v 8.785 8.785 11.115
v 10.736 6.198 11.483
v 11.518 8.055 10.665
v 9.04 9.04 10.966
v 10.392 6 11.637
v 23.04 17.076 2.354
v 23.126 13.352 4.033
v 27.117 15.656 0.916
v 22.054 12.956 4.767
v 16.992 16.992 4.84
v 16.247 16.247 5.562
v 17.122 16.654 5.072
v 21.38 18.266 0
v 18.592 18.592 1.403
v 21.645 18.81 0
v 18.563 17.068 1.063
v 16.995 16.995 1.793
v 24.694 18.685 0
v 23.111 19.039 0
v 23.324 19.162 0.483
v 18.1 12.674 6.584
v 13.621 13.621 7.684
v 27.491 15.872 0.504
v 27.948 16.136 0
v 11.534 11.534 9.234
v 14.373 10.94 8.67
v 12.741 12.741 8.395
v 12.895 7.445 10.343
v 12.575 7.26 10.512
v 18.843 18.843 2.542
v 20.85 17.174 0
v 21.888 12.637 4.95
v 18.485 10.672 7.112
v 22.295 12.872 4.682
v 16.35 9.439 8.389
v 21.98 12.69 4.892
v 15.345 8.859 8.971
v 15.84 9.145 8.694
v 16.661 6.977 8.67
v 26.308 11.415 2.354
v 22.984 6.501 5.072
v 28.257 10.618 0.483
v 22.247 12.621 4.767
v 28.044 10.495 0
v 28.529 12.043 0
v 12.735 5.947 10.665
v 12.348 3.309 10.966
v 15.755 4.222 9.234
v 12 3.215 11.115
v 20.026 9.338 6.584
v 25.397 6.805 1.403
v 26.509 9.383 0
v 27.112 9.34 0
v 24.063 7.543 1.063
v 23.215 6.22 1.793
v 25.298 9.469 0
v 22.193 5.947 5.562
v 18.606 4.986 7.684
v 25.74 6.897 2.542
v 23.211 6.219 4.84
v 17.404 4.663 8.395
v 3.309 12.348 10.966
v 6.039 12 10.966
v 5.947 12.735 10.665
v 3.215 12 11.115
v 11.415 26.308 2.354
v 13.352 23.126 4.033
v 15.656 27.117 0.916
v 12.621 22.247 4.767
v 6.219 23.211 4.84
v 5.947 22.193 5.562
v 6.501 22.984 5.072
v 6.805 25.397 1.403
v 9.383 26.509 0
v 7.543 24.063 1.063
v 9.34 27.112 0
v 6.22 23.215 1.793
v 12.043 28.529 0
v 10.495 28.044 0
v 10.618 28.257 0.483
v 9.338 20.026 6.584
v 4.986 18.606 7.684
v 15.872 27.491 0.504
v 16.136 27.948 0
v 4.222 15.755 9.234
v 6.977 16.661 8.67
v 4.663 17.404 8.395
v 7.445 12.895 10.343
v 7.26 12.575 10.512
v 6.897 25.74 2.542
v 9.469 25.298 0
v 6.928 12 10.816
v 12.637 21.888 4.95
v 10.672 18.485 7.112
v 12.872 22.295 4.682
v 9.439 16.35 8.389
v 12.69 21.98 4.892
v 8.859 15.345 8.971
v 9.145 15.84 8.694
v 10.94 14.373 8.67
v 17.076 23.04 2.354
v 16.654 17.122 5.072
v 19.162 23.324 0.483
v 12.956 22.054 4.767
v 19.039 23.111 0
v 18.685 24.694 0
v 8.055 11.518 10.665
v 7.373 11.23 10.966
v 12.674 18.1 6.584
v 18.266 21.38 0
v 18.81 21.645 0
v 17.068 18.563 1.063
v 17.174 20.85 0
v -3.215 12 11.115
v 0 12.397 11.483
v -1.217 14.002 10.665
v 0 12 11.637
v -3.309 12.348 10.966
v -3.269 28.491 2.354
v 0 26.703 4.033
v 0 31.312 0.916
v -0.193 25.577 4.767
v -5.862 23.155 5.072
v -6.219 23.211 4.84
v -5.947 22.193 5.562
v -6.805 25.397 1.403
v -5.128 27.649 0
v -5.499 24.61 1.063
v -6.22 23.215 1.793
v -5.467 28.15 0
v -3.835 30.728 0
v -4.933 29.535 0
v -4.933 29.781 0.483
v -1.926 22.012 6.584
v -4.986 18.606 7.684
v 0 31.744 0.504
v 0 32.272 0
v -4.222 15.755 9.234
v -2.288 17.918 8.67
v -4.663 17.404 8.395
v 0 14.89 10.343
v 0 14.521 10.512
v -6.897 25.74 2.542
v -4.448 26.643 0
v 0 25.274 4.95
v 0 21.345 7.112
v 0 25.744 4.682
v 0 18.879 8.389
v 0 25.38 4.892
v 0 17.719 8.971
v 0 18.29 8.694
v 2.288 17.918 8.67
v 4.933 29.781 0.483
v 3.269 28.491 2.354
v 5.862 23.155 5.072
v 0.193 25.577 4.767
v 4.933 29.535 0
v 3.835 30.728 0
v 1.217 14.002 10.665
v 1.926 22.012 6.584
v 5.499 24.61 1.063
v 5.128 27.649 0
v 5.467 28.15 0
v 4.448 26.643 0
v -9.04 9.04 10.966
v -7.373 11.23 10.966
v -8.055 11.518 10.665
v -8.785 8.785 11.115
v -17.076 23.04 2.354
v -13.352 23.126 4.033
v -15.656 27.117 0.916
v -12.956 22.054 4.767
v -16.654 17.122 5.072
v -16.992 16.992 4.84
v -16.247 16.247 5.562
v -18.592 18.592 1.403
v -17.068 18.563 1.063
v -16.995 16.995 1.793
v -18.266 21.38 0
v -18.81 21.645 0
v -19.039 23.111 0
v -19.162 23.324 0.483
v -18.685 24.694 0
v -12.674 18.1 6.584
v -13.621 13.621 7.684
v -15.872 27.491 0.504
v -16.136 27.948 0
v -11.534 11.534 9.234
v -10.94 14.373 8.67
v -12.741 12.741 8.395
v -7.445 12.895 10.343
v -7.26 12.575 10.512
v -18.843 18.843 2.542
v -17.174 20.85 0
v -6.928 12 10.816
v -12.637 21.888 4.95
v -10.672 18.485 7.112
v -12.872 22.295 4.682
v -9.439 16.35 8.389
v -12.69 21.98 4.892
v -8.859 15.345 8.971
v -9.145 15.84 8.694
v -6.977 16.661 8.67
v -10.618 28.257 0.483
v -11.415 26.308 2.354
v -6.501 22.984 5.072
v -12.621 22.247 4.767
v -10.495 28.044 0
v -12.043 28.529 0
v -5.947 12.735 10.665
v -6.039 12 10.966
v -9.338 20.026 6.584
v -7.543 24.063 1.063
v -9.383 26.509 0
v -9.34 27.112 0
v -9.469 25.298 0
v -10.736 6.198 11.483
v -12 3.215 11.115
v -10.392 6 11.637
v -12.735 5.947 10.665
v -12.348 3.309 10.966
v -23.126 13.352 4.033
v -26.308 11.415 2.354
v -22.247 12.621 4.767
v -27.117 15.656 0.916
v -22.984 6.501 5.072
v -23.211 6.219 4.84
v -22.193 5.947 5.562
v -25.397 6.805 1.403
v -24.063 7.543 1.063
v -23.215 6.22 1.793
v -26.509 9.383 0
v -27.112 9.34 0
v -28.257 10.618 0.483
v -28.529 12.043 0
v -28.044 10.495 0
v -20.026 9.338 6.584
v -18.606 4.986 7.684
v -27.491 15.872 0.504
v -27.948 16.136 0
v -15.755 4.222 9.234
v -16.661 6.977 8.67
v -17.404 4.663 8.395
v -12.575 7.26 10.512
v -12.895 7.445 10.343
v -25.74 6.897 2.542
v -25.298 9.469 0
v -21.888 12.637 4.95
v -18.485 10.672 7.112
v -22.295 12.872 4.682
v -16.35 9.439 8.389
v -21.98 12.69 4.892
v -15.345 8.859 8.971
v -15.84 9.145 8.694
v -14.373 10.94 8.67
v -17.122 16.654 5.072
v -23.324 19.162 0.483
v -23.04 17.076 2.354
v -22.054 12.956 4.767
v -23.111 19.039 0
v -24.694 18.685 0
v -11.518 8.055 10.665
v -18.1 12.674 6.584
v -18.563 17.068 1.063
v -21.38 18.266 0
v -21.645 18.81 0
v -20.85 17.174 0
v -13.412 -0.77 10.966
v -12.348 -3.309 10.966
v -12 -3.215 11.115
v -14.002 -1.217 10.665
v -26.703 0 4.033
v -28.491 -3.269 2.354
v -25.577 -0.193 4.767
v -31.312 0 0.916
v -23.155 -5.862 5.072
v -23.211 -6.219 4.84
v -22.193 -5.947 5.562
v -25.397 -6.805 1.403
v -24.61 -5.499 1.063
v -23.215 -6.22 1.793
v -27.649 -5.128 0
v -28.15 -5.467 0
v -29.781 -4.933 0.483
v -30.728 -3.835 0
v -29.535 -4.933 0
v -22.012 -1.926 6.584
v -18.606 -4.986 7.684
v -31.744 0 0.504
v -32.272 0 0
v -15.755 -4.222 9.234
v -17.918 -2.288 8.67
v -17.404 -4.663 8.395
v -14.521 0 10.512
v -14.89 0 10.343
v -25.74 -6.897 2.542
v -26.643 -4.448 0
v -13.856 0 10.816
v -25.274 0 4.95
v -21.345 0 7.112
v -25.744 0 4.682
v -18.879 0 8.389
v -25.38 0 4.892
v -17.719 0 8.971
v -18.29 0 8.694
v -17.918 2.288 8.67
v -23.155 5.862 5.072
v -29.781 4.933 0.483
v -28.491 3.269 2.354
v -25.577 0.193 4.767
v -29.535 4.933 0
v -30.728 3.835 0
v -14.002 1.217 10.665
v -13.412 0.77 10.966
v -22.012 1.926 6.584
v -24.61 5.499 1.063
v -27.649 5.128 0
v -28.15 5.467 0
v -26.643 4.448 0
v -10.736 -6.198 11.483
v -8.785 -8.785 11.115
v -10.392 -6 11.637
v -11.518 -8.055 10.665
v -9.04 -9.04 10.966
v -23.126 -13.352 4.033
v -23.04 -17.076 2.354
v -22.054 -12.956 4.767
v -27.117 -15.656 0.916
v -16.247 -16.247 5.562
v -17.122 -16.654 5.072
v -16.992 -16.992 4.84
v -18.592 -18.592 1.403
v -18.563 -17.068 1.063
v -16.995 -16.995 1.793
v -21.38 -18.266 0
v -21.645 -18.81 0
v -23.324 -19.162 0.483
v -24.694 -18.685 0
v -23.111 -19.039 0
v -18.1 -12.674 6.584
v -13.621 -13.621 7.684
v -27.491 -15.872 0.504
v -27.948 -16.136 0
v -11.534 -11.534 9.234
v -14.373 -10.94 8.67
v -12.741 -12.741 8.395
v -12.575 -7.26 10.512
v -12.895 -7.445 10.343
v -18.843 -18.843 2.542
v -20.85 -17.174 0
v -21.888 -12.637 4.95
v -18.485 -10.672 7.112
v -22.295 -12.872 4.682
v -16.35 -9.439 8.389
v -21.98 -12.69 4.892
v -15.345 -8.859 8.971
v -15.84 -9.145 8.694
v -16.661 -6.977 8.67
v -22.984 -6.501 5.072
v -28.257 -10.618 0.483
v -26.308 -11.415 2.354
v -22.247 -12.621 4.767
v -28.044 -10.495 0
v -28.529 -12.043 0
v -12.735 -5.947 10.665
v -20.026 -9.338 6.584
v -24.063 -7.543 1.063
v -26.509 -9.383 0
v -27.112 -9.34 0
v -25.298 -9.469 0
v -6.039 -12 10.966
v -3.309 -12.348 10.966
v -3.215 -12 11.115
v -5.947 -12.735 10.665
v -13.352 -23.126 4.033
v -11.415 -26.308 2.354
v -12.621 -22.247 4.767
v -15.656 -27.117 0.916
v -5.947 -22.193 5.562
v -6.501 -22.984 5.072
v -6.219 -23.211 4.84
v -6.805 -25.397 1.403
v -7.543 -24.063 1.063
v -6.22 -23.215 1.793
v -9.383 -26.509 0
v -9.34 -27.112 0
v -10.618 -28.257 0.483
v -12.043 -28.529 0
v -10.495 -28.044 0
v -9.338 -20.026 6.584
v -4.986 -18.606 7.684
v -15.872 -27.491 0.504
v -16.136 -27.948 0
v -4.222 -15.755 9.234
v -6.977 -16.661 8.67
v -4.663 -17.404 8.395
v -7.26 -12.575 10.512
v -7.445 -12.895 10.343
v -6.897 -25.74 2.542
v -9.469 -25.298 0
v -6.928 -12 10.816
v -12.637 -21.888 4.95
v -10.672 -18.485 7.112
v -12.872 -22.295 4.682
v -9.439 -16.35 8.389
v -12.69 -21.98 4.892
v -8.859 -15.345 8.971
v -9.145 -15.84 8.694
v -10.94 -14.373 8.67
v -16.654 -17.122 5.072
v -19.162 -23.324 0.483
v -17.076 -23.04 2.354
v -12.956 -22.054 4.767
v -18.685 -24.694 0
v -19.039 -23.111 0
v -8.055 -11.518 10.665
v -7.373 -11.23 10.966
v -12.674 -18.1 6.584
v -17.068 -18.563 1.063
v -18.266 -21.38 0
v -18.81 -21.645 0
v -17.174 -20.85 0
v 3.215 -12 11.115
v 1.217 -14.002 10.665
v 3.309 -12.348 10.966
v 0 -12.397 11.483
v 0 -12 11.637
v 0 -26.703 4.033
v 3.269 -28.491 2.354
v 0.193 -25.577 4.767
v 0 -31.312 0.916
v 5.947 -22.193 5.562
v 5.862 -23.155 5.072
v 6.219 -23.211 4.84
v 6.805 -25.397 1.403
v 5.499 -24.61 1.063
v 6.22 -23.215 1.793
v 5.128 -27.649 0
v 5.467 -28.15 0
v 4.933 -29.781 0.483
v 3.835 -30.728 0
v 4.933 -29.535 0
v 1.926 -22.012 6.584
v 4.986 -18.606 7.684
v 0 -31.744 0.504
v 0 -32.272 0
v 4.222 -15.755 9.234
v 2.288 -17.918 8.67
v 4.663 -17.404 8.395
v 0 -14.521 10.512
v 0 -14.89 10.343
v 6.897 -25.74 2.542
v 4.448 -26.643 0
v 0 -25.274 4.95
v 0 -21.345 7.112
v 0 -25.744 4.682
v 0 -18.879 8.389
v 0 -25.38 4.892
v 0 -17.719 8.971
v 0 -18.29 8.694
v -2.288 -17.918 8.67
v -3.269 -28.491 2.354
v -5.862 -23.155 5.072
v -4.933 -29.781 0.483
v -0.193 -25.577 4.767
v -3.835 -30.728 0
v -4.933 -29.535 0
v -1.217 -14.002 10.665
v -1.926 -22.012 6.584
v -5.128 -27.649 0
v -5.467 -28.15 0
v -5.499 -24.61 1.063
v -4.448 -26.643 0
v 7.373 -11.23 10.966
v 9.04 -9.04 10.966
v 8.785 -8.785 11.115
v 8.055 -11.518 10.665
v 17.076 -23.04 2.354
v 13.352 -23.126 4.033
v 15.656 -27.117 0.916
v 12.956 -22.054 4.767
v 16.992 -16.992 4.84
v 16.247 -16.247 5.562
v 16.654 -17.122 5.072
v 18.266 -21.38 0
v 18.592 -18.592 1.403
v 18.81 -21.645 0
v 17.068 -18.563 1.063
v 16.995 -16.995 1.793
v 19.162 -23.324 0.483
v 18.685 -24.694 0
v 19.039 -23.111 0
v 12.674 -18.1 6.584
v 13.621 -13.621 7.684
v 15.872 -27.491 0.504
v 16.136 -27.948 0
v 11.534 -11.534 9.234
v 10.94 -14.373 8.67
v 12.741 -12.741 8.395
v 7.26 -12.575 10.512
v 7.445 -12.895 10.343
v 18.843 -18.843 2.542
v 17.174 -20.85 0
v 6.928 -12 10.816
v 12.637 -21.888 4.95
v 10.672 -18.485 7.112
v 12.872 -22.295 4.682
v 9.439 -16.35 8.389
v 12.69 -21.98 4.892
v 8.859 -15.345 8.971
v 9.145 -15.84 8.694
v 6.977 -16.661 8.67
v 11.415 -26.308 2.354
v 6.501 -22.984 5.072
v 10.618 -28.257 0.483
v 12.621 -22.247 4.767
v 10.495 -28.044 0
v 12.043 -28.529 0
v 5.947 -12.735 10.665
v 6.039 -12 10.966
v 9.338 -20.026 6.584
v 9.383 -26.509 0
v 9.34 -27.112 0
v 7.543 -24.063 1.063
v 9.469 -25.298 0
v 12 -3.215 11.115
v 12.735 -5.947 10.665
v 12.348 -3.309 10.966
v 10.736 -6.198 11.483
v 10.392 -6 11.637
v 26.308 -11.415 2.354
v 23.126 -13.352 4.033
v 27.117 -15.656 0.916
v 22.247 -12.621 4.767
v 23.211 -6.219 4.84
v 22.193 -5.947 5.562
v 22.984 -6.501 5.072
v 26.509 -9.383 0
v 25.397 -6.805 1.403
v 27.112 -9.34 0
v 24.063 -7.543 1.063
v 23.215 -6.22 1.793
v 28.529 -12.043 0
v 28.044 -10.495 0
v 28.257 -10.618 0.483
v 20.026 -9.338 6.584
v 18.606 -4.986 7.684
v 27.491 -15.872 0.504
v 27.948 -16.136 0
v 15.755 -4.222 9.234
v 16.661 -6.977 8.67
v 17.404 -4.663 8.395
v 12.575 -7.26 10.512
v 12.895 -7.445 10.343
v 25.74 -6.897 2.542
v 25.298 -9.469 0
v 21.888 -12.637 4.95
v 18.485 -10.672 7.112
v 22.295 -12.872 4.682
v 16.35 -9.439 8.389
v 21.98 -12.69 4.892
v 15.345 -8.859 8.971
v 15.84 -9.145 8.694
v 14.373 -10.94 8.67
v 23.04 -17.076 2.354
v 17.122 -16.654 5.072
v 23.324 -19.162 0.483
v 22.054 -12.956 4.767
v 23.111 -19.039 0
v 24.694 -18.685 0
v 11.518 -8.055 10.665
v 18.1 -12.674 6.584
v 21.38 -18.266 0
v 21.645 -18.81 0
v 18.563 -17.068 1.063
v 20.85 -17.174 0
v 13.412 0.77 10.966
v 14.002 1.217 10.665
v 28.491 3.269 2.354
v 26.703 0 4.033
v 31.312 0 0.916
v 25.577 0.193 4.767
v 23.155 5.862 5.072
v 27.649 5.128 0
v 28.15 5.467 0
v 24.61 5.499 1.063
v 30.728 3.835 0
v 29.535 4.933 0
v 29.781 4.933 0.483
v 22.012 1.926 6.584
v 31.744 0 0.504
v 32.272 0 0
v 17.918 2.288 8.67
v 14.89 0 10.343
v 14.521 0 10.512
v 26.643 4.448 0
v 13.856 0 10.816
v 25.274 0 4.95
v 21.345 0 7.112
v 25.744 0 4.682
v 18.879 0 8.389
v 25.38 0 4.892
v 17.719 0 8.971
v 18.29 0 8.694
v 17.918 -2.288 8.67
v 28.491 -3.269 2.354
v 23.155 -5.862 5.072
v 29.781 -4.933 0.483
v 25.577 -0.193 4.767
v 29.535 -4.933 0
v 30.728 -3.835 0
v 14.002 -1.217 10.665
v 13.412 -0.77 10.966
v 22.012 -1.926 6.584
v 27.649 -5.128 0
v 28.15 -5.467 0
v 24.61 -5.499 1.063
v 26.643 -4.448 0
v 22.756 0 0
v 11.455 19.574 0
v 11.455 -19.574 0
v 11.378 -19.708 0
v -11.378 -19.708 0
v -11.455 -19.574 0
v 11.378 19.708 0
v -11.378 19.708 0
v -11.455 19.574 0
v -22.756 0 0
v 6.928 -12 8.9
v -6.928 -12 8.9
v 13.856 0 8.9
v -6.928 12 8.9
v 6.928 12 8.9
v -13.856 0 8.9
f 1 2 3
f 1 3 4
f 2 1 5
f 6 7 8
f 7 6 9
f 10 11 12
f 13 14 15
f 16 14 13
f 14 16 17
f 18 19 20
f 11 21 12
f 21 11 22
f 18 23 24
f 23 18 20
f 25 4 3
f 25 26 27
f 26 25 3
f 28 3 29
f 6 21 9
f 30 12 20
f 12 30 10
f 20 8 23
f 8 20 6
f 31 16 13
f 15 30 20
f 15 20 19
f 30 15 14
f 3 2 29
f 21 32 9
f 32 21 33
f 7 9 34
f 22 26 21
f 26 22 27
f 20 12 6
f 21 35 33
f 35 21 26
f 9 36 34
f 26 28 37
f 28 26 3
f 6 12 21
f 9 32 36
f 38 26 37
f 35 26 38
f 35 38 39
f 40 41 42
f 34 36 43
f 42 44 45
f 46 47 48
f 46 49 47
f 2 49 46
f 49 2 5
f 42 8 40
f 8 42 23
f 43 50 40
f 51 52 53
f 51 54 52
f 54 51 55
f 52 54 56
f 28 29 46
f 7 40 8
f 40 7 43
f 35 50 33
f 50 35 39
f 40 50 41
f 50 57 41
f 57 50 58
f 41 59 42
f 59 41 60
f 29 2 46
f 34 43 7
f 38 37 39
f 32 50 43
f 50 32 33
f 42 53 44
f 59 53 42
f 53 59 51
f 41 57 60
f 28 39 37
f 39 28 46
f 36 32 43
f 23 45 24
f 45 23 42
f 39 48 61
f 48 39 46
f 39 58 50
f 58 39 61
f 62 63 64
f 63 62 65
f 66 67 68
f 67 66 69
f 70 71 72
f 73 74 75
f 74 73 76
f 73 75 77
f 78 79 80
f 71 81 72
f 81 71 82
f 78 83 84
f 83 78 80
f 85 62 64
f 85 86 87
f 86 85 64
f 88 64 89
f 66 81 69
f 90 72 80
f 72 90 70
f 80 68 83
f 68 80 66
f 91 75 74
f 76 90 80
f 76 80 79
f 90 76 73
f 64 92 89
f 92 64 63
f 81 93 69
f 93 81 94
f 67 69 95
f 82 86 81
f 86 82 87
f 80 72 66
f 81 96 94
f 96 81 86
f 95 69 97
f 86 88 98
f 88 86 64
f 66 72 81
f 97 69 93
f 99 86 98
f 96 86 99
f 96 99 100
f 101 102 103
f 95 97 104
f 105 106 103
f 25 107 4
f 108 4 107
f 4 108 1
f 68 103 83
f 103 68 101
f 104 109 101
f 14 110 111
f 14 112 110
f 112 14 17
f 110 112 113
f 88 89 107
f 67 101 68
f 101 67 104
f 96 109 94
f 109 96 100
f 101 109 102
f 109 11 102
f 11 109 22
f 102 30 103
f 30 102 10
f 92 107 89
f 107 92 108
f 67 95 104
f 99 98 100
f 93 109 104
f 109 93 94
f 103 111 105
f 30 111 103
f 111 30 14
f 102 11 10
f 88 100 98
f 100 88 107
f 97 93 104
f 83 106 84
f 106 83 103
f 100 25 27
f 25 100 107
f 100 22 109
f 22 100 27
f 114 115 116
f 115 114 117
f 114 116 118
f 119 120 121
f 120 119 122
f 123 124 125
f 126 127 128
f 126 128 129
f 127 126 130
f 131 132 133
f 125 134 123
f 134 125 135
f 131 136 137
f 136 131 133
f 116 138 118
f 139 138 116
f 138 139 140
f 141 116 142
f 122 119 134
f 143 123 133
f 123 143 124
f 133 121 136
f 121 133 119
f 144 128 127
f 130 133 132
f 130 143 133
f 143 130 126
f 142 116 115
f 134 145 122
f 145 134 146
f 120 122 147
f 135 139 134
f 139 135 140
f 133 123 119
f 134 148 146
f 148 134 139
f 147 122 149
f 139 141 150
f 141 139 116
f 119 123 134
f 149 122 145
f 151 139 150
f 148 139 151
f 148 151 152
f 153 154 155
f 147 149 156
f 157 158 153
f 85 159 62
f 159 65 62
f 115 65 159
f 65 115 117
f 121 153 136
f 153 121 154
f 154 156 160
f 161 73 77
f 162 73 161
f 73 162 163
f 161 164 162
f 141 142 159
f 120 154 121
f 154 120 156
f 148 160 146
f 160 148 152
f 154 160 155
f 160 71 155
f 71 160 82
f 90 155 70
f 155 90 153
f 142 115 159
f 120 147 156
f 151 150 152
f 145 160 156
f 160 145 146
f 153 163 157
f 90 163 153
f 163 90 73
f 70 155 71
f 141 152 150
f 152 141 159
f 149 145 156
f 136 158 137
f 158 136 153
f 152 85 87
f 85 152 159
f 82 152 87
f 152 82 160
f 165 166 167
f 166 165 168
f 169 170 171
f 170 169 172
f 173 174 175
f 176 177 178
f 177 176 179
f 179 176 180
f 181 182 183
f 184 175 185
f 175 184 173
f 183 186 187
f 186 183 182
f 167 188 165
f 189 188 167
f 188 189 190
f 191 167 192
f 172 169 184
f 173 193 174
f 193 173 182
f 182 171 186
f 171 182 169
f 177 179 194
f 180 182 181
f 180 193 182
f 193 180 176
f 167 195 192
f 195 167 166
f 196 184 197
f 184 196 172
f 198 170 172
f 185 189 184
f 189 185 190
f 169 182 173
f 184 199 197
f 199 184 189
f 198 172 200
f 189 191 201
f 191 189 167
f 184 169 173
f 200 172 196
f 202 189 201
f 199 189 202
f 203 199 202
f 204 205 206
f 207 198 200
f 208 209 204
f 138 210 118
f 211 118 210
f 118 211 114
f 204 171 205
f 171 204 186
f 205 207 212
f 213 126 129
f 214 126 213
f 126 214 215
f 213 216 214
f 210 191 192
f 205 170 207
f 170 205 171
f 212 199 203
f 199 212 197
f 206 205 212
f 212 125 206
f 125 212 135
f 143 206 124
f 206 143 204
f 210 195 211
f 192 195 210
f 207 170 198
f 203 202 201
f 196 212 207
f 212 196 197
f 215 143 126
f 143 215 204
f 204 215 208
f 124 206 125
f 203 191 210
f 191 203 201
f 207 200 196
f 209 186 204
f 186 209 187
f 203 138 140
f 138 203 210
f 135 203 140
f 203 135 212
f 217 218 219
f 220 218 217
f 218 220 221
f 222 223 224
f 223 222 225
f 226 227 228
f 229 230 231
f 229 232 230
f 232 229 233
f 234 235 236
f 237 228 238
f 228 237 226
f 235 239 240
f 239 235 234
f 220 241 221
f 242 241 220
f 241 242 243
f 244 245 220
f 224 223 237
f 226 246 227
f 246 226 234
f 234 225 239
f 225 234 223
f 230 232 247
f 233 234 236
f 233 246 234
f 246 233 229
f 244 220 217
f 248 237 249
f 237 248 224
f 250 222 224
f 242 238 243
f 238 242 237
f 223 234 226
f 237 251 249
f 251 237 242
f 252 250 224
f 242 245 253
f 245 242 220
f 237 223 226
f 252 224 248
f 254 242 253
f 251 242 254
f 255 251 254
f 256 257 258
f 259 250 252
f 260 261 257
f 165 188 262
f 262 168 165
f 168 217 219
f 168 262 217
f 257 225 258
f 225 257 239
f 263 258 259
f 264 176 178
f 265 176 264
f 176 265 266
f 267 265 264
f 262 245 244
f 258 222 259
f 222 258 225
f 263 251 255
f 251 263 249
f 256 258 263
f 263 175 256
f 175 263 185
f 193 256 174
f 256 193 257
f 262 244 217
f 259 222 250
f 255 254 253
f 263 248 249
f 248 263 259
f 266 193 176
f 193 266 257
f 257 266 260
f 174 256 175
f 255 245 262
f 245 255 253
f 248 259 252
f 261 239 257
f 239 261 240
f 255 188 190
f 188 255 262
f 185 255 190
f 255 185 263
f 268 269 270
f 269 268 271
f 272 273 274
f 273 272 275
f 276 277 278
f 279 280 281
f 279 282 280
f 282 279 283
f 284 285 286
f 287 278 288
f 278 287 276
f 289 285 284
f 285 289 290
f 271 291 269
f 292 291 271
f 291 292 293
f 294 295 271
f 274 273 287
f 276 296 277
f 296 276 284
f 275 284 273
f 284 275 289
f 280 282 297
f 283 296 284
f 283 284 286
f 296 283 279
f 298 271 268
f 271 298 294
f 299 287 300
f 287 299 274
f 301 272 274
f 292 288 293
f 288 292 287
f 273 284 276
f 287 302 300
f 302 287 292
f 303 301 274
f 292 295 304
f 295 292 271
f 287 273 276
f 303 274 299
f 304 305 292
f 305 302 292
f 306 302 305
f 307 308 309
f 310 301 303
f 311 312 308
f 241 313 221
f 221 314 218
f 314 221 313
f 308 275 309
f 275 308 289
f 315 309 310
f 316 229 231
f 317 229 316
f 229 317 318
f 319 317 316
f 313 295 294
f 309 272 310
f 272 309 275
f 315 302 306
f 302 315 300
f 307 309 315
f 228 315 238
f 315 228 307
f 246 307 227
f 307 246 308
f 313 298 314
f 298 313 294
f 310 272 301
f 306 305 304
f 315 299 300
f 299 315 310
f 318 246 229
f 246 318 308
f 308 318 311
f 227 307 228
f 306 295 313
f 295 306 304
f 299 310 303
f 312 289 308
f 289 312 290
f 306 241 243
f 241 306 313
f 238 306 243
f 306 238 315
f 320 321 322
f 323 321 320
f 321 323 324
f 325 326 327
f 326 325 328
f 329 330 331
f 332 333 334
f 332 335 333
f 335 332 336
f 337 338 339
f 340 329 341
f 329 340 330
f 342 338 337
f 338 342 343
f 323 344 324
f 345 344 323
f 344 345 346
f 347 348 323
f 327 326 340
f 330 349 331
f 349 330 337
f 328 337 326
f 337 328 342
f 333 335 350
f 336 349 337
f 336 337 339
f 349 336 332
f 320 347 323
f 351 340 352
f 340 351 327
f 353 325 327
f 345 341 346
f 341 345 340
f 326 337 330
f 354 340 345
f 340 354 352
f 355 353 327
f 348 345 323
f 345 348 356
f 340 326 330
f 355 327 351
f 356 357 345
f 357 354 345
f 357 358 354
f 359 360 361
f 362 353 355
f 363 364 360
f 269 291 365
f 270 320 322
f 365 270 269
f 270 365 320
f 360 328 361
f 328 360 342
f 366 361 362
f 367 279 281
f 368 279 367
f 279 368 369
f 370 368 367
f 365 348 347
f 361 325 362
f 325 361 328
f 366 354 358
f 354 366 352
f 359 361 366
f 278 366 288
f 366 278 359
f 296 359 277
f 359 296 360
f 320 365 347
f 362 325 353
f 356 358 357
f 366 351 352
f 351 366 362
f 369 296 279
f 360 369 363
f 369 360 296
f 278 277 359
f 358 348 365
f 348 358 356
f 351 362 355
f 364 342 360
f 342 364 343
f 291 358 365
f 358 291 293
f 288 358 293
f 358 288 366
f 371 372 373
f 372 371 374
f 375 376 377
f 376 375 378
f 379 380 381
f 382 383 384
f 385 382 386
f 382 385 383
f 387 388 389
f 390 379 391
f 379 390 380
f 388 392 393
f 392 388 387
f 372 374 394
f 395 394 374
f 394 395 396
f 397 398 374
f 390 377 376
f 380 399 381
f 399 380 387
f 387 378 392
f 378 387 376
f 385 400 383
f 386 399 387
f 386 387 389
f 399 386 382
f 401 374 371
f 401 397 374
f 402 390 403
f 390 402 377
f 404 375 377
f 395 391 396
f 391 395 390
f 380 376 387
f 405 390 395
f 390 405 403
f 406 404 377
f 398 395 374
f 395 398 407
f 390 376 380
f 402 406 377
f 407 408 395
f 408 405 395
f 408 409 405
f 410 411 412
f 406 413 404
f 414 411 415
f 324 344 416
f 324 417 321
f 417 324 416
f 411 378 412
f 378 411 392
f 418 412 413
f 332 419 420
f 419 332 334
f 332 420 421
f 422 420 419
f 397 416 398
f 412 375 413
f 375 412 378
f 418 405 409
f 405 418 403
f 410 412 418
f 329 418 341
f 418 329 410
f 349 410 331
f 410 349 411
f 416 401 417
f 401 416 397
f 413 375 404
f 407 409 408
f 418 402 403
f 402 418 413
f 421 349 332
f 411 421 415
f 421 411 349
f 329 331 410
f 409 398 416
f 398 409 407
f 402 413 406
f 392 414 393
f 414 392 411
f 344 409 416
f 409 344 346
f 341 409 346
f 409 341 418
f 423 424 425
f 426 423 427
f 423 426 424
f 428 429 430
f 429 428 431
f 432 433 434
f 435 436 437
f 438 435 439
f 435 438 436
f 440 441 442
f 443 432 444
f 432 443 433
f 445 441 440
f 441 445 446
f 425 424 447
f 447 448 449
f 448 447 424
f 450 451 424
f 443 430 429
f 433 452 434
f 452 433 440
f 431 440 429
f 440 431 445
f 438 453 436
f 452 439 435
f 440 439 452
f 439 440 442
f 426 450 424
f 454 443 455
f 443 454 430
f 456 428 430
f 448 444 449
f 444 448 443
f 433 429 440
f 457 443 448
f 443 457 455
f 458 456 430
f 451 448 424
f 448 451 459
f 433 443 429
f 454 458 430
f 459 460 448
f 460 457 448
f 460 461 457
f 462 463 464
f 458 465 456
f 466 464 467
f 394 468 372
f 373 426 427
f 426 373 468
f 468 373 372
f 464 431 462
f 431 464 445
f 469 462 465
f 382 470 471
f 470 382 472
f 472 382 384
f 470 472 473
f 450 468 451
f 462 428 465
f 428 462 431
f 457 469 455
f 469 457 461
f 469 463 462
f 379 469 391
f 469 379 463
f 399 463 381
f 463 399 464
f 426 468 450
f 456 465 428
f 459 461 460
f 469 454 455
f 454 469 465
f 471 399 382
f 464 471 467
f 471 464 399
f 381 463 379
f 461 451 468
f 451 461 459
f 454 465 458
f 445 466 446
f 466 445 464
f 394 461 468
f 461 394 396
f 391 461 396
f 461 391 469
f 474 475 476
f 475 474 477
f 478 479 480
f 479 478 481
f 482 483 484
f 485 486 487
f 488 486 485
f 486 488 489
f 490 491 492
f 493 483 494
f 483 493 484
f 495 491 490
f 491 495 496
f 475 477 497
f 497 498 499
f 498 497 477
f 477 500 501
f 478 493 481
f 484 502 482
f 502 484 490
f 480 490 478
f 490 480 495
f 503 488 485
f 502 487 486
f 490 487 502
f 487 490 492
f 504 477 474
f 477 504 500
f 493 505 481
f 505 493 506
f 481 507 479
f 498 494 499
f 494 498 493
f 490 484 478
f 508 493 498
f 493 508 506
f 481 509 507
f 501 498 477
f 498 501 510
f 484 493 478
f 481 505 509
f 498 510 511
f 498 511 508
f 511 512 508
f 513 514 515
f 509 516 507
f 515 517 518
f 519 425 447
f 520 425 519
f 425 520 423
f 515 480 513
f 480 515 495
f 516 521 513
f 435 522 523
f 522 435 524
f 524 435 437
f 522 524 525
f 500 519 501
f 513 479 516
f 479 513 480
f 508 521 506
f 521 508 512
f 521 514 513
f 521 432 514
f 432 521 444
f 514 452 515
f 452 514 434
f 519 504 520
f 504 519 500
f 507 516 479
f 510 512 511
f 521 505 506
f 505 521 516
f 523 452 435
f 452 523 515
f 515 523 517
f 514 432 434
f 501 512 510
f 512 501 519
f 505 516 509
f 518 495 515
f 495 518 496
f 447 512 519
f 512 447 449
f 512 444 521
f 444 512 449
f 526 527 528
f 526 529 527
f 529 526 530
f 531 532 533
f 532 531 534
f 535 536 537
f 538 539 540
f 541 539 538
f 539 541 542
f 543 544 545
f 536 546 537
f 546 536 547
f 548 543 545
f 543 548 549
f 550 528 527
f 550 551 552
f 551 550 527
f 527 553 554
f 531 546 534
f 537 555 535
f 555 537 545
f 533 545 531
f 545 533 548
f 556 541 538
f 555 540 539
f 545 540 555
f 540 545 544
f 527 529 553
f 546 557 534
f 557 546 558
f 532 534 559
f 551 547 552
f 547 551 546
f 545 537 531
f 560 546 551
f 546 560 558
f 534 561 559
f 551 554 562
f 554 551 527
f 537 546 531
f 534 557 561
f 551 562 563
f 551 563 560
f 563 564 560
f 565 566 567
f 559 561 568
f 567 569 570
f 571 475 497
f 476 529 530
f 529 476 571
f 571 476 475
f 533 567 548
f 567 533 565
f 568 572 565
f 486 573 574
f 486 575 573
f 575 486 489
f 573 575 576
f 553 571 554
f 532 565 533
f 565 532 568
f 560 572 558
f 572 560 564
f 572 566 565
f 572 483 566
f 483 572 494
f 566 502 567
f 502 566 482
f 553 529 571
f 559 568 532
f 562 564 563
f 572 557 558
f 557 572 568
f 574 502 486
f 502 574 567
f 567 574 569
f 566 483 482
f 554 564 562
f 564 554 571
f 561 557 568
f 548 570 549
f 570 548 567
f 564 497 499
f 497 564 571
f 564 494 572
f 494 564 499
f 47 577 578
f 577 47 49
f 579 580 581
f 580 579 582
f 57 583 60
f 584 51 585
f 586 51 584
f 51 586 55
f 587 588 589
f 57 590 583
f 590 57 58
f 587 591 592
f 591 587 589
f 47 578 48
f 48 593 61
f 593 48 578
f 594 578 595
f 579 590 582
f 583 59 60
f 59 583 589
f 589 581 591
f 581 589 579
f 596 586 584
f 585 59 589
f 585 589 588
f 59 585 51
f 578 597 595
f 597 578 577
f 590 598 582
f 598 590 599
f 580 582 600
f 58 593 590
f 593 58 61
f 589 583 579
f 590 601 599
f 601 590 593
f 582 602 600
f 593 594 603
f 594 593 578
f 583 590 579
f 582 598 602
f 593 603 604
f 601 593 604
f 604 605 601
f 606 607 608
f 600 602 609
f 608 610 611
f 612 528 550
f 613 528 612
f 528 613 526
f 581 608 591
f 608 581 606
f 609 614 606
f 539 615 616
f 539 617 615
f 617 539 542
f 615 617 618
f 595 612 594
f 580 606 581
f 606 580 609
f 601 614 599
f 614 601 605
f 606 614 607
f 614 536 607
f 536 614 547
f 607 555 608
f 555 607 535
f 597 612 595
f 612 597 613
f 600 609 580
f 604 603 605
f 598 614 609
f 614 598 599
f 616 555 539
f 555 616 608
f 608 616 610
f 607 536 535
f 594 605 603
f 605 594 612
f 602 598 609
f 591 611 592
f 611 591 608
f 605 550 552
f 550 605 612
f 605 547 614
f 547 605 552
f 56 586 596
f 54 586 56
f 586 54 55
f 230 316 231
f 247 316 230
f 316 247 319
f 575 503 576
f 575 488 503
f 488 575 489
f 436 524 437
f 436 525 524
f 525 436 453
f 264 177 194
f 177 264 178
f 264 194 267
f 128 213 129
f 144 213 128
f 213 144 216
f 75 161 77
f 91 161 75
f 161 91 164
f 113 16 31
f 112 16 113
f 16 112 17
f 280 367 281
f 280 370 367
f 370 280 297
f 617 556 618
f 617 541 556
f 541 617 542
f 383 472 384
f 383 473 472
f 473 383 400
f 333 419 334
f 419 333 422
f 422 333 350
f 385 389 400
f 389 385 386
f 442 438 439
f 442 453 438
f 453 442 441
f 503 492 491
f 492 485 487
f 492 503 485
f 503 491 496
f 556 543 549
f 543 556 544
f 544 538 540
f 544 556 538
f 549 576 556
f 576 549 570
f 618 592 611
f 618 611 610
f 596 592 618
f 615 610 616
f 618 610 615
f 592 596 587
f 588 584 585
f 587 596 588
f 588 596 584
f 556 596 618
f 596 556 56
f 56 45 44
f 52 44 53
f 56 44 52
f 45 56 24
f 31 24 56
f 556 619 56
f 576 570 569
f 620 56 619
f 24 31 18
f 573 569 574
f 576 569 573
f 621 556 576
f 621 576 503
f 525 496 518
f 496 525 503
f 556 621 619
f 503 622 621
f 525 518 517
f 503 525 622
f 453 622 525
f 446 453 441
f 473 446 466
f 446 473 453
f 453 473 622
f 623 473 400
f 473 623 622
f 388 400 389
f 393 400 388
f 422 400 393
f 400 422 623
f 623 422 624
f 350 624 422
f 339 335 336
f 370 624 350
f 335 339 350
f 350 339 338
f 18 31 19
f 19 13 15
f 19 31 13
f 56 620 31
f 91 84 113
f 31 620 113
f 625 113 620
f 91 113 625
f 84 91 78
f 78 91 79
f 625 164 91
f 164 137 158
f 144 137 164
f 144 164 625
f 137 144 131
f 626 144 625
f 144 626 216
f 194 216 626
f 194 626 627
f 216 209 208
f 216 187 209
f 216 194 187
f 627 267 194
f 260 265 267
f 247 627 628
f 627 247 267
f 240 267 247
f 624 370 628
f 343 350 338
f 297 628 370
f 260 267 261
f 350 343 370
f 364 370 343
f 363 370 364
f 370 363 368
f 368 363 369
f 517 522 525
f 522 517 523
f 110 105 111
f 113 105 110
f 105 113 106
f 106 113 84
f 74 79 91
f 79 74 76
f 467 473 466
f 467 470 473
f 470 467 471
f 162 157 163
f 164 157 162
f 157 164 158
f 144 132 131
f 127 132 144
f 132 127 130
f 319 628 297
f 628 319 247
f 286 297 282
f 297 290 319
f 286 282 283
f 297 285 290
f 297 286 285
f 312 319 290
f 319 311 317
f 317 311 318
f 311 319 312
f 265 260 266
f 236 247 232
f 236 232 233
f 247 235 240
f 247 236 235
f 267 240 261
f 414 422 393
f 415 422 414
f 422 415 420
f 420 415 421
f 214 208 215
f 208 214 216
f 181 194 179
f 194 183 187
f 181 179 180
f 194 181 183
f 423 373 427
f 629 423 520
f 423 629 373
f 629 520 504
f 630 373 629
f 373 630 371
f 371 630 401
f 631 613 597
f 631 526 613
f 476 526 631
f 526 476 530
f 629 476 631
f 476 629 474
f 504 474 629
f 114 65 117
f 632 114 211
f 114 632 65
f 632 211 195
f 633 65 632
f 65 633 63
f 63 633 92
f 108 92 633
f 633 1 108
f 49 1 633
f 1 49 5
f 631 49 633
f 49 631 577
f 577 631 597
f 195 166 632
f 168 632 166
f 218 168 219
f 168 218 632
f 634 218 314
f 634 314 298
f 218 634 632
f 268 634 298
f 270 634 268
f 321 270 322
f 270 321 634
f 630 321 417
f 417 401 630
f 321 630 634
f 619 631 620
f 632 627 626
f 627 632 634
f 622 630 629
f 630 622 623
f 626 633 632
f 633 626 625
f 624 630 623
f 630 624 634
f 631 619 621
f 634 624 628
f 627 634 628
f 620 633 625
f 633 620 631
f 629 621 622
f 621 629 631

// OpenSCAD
// Rosette
// (c) 2013 Wouter Robers

HoleDiameter=24;
NumberOfSidesForHole=6; //[4:60]
NumberOfLeaves=12; //[3:30]
LeafLength=20;  //[10:40]
LeafWidth=15; //[2:20]
LeafThickness=3; //[1:10]
LeafPointyness=4; //[0:10]
HalfOrFull="Full"; //[Half,Full]
// Polygons
$fn=15; //[15:Rough,30:Medium,60:Fine]

difference(){
union(){
translate([0,0,-0.1]) cylinder(r1=28,r2=0,h=17,$fn=12);
translate([0,0,15]) for(i=[1:NumberOfLeaves]){
rotate([0,27,i*360/NumberOfLeaves])
intersection(){
scale([LeafLength,LeafWidth,LeafThickness]) translate([1,-LeafPointyness/10,0])sphere(1);
scale([LeafLength,LeafWidth,LeafThickness]) translate([1,LeafPointyness/10,0])sphere(1);
}
}

}
// Cutting floor
translate([0,0,-100]) cube(200,center=true);
//Cutting half
if(HalfOrFull=="Half"){
translate([0,-50,0]) cube(100,center=true);}
// Hexagonal hole
translate([0,0,-1]) cylinder(r=HoleDiameter/2/cos(180/NumberOfSidesForHole),h=70,$fn=NumberOfSidesForHole);
translate([0,0,-0.1]) cylinder(r1=12/(0.5*sqrt(3))+9,r2=HoleDiameter/2/sin(60),h=9,$fn=NumberOfSidesForHole);
}




